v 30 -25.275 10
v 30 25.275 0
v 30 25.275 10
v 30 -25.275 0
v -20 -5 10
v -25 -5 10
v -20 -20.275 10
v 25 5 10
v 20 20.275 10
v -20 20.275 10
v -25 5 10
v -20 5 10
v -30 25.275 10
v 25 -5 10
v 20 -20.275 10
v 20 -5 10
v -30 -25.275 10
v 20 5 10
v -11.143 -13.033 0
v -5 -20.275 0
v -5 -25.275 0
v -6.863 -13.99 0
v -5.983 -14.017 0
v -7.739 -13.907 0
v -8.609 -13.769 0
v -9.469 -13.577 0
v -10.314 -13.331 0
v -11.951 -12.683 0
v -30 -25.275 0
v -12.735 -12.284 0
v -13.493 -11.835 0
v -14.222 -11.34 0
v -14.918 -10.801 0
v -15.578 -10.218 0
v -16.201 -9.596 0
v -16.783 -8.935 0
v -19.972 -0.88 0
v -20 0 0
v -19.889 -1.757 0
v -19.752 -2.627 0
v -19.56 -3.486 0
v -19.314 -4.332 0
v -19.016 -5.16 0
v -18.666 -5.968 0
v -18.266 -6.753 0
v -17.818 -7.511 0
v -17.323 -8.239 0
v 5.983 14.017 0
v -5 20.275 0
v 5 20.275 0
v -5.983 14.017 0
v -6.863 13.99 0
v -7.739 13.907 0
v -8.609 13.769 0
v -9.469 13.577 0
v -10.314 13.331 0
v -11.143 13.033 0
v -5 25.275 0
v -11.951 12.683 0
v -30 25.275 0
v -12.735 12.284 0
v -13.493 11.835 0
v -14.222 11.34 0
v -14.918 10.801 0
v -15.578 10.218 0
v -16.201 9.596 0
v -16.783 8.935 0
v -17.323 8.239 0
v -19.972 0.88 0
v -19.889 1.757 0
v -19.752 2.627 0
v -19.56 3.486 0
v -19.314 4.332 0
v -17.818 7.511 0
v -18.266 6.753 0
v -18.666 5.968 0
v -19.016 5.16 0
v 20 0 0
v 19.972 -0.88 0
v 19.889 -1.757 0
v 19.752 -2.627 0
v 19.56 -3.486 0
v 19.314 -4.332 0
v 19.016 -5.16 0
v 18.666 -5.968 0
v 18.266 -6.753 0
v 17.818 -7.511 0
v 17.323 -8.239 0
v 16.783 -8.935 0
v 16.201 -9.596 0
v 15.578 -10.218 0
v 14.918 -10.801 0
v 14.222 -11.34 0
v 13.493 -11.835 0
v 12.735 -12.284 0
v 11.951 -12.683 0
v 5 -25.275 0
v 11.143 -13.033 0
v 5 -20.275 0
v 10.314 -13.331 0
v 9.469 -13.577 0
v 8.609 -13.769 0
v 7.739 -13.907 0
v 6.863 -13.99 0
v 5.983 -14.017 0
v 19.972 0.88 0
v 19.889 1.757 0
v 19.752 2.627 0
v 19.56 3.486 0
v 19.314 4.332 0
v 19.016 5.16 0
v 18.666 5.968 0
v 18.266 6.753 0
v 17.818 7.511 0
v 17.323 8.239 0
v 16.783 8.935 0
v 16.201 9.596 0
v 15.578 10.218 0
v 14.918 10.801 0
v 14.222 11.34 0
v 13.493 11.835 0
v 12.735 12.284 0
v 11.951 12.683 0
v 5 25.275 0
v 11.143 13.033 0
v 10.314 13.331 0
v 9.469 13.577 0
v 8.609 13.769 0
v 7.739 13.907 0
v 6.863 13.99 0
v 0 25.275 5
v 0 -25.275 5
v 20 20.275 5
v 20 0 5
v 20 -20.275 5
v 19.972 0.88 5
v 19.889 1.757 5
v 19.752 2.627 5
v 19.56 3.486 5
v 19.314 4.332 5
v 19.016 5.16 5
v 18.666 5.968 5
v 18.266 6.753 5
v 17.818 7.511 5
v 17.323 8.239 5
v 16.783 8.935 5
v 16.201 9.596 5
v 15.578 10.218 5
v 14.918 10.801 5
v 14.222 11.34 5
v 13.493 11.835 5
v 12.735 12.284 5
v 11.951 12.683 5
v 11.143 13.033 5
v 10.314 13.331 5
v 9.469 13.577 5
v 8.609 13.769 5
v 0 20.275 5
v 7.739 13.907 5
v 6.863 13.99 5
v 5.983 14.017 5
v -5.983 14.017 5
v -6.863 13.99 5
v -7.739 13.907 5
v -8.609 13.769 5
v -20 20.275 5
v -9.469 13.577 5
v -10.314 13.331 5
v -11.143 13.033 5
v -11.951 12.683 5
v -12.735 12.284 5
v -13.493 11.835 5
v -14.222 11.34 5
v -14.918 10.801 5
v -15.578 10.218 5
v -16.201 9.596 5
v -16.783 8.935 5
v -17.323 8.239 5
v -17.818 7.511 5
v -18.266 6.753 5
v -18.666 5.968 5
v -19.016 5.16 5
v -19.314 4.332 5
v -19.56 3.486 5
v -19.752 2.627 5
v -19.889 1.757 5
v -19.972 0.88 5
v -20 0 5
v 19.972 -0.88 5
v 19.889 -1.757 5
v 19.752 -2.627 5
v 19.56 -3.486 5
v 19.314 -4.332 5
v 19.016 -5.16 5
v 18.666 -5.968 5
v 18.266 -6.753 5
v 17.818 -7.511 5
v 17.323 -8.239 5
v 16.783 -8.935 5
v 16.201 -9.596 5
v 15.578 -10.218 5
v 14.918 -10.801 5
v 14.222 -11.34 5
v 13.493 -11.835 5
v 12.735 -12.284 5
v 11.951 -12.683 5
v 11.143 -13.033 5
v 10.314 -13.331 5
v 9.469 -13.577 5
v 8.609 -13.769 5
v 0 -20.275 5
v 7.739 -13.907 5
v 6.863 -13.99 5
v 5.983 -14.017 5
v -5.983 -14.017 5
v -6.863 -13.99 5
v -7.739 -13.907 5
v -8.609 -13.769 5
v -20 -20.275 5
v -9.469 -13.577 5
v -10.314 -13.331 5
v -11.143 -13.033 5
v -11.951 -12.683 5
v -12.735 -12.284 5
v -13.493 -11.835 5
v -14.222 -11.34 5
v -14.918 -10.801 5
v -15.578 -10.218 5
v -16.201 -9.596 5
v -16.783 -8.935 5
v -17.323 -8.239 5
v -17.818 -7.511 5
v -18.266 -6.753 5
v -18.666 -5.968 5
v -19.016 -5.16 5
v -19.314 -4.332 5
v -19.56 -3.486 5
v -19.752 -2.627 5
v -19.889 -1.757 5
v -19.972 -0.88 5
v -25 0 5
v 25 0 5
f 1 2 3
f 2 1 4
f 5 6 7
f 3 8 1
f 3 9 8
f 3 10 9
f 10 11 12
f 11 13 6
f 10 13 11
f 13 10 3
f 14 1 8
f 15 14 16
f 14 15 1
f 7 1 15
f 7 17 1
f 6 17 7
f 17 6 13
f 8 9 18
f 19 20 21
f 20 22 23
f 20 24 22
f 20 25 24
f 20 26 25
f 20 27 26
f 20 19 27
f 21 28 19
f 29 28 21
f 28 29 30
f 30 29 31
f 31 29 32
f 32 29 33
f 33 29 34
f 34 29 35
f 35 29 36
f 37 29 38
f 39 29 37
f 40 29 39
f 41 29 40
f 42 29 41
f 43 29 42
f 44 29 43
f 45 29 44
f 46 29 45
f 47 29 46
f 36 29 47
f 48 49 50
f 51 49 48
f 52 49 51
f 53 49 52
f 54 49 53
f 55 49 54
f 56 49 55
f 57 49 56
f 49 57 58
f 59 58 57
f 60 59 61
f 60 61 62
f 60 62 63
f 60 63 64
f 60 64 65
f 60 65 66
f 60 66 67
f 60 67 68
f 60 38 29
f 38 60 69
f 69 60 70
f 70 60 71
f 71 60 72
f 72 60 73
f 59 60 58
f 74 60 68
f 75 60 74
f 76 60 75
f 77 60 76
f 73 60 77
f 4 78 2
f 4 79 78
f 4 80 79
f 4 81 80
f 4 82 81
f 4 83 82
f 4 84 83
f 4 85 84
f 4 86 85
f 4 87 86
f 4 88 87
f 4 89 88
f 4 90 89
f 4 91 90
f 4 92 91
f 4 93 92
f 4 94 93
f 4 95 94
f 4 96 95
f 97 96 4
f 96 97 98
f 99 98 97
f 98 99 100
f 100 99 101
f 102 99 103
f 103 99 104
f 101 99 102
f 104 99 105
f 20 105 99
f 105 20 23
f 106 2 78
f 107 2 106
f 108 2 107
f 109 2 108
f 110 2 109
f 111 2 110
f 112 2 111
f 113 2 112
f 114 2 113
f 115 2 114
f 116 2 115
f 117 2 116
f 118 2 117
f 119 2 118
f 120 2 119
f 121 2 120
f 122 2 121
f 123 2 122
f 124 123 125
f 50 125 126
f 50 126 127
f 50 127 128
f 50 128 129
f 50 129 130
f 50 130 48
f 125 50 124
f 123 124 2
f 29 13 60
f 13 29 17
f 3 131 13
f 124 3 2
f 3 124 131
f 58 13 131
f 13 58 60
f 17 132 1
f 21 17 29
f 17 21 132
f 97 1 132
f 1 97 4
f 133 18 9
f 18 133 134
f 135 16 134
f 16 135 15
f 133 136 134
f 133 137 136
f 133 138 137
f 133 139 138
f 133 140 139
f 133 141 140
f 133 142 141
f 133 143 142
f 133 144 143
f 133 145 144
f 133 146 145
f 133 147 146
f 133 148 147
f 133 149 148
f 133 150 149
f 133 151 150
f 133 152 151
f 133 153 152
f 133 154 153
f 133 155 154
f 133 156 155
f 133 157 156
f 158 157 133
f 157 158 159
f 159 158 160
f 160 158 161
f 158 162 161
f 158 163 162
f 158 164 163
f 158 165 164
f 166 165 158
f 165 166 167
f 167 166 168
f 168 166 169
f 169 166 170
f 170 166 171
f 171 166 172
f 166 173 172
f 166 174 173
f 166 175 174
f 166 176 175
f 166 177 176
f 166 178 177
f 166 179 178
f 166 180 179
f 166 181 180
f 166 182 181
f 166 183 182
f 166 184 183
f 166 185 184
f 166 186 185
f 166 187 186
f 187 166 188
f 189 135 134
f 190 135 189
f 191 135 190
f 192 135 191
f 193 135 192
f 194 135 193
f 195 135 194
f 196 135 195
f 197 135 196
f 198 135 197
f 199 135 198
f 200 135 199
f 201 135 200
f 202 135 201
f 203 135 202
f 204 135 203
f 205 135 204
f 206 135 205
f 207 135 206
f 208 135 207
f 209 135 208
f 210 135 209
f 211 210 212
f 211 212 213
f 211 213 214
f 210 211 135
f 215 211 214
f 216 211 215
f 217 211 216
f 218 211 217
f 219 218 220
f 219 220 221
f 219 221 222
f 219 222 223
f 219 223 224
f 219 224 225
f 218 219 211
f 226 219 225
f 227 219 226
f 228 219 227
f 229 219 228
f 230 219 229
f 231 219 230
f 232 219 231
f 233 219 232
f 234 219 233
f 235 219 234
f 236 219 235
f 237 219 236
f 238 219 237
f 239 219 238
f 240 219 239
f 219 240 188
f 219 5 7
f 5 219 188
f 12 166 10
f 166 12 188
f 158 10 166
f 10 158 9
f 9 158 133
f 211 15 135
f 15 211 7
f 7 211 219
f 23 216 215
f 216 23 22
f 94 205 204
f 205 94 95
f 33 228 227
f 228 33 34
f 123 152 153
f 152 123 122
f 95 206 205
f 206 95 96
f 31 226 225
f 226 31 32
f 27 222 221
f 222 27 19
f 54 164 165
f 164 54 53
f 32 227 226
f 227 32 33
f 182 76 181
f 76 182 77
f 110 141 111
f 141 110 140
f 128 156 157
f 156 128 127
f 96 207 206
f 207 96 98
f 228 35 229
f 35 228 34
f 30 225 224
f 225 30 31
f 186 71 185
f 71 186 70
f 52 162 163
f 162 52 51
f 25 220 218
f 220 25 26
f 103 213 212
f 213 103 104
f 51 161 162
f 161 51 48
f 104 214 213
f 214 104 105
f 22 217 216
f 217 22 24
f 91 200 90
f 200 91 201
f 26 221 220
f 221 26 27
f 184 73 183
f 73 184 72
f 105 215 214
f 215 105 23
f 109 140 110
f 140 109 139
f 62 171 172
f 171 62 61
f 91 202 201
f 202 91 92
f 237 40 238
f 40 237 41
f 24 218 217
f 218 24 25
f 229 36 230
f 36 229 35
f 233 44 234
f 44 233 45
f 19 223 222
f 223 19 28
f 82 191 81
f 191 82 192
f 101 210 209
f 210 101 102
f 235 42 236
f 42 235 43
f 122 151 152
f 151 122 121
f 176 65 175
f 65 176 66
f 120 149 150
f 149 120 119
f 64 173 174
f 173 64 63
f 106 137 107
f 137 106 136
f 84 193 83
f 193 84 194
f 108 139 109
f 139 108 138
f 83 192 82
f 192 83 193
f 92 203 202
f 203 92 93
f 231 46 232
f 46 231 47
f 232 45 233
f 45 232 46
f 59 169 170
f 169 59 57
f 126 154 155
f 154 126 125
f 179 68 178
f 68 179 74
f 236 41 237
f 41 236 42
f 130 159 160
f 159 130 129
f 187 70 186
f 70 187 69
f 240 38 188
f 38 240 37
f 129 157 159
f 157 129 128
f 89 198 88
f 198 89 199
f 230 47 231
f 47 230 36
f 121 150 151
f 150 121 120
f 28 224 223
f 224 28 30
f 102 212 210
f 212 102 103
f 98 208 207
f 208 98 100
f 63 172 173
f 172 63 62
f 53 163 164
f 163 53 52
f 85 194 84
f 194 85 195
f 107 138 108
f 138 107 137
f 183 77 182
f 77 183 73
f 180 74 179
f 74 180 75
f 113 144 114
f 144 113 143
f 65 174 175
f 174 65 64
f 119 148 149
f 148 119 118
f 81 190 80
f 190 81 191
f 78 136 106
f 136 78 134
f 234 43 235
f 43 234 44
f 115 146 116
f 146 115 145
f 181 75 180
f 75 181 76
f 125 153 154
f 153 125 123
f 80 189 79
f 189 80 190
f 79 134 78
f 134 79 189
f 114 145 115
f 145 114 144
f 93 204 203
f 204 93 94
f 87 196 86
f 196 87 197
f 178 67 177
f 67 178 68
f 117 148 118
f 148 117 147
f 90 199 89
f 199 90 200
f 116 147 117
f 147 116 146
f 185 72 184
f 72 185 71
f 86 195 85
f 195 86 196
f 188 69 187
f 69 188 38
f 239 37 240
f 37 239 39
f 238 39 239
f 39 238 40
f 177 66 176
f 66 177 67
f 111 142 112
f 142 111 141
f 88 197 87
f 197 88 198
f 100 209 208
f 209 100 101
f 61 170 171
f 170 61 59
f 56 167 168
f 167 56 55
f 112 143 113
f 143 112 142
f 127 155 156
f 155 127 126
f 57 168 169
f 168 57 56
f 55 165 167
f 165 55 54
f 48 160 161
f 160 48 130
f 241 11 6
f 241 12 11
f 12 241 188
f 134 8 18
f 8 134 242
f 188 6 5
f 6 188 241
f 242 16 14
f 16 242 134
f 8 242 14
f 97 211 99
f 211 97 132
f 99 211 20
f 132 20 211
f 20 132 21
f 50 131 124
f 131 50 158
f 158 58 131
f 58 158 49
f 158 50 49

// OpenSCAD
//kloub stredná časť

inner_a = 40; //x
inner_height = 5;  //z
par_klb = 2; //výška str klbu nad podstavou
par_klb2 = 6;
pom1 = sqrt(inner_a * inner_a + par_klb * par_klb);
pom2 = inner_height * par_klb/(inner_a/2);
inner_b = pom1 + pom2; //y

brit = 5;
hrana = 5;
plate = 5;
a=60;
b=14;
outer_a = inner_a + 2*brit + 2*hrana;
outer_b = inner_b + 2*brit; // + 2*hrana;
outer_height = inner_height + plate;
inner_diameter = (inner_a/2 - par_klb2) * pom1 / (inner_a/2);

difference(){    
    translate ([0,0,outer_height/2]) {
        cube([outer_a,outer_b,outer_height],center = true);
        }
    translate([0,0,inner_height + plate]){
        cube([inner_a,inner_b,inner_height*2],center = true);
        }
    hull() {
        translate([-(inner_a/2 - inner_diameter/2),0,-outer_height]) {cylinder (h=outer_height*4, r=inner_diameter/2,$fn = 100);}
        translate([inner_a/2 - inner_diameter/2,0,-outer_height]) {cylinder (h=outer_height*4, r=inner_diameter/2,$fn = 100);}
        }
    translate([0,0,(a * sqrt(2) / 2) + plate]) {
            rotate ([45,0,0]) {
                cube([inner_a + 2 * brit, a,a],center=true);
                }
            } 
    translate([0,-b/2-outer_b/2+brit,-(b * sqrt(2) / 2) + plate]){
        rotate ([0,45,0]){
            cube(b,center=true);
    }
}
    translate([0,b/2+outer_b/2-brit,-(b * sqrt(2) / 2) + plate]){
        rotate ([0,45,0]){
            cube(b,center=true);
    }
}
           
}
